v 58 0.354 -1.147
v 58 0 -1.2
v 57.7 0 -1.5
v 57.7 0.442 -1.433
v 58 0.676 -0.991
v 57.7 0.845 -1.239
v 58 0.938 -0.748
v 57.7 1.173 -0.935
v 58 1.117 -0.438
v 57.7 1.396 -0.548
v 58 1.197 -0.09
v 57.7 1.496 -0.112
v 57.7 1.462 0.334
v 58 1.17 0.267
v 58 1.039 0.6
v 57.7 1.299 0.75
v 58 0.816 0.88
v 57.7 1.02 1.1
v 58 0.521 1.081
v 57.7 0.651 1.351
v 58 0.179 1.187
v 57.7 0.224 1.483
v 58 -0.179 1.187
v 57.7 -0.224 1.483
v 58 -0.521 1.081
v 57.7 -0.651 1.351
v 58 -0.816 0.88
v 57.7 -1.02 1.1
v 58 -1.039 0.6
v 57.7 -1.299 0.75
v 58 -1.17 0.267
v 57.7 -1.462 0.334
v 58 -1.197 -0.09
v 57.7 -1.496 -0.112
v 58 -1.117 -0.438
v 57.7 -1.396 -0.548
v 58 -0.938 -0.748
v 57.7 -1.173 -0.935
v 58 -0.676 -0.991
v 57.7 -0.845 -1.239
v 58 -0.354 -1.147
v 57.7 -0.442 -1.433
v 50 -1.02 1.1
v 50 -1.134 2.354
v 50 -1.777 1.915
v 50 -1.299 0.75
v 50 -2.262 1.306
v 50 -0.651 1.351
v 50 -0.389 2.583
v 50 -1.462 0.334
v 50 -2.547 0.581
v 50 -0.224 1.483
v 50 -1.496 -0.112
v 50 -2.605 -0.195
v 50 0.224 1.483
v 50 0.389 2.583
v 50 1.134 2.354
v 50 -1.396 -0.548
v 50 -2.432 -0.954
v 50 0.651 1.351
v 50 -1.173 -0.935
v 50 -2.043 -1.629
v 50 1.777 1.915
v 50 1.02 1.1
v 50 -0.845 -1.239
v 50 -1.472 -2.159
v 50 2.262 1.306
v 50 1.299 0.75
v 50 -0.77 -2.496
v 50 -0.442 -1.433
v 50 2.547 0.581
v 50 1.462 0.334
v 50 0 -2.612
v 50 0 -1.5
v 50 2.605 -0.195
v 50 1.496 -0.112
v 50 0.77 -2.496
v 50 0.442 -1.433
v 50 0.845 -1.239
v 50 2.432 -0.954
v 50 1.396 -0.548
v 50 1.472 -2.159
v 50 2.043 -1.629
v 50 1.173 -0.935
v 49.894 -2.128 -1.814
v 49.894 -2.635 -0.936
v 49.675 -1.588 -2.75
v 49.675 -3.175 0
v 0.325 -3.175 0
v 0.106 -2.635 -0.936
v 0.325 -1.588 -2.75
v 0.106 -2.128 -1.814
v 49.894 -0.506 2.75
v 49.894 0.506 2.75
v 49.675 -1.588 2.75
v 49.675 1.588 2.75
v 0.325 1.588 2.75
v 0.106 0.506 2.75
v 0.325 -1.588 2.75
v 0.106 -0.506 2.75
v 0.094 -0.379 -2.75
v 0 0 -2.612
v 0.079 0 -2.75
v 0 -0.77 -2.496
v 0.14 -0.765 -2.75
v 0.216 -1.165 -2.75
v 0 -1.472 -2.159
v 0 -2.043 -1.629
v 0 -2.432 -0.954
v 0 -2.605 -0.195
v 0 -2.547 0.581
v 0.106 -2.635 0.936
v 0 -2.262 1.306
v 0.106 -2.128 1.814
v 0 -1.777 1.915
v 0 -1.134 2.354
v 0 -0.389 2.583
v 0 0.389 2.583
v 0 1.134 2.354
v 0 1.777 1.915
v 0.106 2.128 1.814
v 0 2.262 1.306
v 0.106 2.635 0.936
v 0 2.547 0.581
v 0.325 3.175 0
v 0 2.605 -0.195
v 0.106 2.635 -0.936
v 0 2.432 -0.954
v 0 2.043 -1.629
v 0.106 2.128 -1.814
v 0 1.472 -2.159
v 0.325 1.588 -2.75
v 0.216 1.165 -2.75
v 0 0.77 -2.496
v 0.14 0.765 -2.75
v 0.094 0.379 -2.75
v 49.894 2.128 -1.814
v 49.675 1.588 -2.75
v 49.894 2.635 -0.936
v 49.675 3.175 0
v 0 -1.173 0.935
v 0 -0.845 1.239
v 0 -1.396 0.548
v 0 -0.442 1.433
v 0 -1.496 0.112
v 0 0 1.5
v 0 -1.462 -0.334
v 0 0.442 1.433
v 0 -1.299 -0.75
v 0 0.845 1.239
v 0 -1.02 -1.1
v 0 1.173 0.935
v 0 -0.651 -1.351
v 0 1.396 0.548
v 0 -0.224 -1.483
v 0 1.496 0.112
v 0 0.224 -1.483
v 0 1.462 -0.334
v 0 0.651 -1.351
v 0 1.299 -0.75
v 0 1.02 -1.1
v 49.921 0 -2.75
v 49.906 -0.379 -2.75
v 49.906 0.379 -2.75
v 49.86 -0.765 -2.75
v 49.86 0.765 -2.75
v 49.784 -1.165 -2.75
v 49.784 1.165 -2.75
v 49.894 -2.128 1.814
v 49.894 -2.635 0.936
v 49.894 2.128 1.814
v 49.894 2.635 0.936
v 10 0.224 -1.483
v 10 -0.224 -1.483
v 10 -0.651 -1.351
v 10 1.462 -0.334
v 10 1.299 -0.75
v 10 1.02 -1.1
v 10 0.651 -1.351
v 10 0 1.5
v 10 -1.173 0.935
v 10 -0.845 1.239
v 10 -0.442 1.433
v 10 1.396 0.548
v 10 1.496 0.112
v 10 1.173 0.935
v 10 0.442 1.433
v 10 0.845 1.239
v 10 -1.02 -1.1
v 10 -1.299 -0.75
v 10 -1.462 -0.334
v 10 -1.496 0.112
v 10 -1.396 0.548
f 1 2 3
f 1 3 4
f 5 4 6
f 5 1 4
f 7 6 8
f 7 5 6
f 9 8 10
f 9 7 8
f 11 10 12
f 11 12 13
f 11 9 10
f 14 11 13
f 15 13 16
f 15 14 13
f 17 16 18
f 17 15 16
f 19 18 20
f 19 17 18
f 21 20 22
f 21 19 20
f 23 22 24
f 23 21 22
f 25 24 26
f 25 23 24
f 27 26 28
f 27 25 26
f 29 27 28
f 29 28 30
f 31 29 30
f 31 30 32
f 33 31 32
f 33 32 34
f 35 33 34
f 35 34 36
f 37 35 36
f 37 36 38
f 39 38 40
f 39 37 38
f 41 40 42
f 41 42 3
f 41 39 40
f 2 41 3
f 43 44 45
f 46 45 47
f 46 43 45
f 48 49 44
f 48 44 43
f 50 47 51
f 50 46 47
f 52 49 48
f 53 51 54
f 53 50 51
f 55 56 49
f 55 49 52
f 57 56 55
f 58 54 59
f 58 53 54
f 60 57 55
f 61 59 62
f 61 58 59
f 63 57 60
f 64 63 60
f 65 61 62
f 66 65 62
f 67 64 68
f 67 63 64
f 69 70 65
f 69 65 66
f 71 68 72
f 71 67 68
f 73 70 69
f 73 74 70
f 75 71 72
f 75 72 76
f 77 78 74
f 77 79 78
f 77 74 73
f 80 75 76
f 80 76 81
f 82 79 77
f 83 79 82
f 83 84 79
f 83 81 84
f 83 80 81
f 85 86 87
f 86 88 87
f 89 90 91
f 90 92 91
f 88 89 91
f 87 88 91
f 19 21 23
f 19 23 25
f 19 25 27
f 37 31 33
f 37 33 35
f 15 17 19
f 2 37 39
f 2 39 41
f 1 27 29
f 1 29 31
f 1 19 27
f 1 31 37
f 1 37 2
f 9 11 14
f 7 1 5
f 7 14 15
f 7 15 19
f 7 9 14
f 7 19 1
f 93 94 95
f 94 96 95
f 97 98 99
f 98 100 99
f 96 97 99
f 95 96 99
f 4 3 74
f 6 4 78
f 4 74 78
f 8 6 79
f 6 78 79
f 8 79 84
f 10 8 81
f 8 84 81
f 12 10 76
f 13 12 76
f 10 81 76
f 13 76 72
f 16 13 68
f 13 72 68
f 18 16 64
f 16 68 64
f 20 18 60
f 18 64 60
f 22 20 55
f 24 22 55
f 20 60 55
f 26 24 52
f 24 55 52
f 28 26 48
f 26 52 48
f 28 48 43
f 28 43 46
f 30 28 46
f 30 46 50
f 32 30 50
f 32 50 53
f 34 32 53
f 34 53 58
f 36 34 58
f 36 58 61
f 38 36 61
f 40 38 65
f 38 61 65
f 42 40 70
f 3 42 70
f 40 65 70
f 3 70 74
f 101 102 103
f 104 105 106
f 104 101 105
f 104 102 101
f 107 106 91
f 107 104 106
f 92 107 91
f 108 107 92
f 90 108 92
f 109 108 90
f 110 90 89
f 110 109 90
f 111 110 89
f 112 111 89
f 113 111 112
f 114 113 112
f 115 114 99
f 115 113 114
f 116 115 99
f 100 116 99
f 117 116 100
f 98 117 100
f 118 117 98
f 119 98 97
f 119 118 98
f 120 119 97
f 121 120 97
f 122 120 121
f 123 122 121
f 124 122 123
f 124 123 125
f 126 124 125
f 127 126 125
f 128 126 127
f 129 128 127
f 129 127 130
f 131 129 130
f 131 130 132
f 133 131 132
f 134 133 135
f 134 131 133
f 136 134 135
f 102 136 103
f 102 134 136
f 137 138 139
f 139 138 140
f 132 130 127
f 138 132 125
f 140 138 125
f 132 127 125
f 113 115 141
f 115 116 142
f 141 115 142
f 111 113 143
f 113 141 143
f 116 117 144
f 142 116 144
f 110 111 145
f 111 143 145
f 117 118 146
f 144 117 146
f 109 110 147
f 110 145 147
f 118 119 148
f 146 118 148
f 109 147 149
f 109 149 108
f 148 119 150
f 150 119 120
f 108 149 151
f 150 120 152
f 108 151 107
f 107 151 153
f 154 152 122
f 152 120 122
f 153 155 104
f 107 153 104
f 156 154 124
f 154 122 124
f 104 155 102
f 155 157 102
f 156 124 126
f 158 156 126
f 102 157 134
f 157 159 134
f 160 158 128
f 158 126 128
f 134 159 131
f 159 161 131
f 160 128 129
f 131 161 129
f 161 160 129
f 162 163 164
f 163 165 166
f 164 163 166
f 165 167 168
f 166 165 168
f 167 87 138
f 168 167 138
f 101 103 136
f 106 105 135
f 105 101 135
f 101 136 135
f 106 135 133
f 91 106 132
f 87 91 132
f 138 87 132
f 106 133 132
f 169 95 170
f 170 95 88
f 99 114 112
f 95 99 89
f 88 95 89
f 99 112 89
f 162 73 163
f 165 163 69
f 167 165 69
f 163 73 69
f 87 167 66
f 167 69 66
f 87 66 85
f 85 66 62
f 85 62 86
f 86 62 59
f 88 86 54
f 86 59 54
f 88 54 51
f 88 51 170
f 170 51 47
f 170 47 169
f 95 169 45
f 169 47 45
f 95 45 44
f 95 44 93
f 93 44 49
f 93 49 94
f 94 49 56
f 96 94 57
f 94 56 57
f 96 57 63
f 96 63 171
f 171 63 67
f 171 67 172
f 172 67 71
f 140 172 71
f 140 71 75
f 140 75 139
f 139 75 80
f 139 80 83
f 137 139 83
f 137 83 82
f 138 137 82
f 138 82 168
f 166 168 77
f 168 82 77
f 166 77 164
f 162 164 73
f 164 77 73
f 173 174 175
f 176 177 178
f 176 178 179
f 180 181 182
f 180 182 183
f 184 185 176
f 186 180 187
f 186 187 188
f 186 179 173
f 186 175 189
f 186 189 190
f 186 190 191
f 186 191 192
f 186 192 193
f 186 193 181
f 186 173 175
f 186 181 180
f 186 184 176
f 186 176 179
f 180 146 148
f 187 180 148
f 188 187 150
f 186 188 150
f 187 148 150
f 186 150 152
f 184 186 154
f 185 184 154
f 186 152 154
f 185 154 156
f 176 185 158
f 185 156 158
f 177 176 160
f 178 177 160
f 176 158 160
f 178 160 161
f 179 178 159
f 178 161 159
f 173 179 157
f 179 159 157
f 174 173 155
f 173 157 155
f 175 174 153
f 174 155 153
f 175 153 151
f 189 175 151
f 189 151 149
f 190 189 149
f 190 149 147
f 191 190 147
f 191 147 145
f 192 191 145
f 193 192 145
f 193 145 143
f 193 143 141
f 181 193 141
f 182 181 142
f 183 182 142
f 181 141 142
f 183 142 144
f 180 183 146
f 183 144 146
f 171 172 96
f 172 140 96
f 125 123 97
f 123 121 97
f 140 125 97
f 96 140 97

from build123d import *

# Parameters (mm, degrees)
BOSS_EXTRUDE1_DEPTH = 50
SKETCH2_R           = 1.5
BOSS_EXTRUDE2_DEPTH = 8
SKETCH3_R           = 1.5
CUT_EXTRUDE1_DEPTH  = 10
CHAMFER1_SIZE       = 0.3


with BuildPart() as part:
    # Sketch1 → Boss-Extrude1 (new body)
    with BuildSketch(Plane(origin=(0, 0, 0), x_dir=(0, 0, -1), z_dir=(1, 0, 0))):
        Polygon((0, 3.175426481), (-2.75, 1.58771324), (-2.75, -1.58771324), (0, -3.175426481), (2.75, -1.58771324), (2.75, 1.58771324), align=None)
    extrude(amount=BOSS_EXTRUDE1_DEPTH)

    # Sketch2 → Boss-Extrude2 (add)
    with BuildSketch(Plane(origin=(50, 0, 0), x_dir=(0, 0, -1), z_dir=(1, 0, 0))):
        Circle(SKETCH2_R)
    extrude(amount=BOSS_EXTRUDE2_DEPTH)

    # Sketch3 → Cut-Extrude1 (cut)
    with BuildSketch(Plane.ZY):
        Circle(SKETCH3_R)
    extrude(amount=-CUT_EXTRUDE1_DEPTH, mode=Mode.SUBTRACT)

    # Sketch4 → Cut-Revolve1 (revolve, cut)
    with BuildSketch(Plane(origin=(0, 0, 0), x_dir=(1, 0, 0), z_dir=(0, 1, 0))):
        Polygon((0, 10.219809024), (4.392081913, 10.219809024), (0, 2.6125), align=None)
        Polygon((50, 2.6125), (50, 10.219809024), (45.607918087, 10.219809024), align=None)
    revolve(axis=Axis((0, 0, 0), (-1, 0, 0)), mode=Mode.SUBTRACT)

    # Chamfer1
    chamfer1_edges = [part.edges().sort_by_distance(p)[0] for p in [
        (58, 0, 1.5),
    ]]
    chamfer(chamfer1_edges, length=CHAMFER1_SIZE)


solid = part.part
